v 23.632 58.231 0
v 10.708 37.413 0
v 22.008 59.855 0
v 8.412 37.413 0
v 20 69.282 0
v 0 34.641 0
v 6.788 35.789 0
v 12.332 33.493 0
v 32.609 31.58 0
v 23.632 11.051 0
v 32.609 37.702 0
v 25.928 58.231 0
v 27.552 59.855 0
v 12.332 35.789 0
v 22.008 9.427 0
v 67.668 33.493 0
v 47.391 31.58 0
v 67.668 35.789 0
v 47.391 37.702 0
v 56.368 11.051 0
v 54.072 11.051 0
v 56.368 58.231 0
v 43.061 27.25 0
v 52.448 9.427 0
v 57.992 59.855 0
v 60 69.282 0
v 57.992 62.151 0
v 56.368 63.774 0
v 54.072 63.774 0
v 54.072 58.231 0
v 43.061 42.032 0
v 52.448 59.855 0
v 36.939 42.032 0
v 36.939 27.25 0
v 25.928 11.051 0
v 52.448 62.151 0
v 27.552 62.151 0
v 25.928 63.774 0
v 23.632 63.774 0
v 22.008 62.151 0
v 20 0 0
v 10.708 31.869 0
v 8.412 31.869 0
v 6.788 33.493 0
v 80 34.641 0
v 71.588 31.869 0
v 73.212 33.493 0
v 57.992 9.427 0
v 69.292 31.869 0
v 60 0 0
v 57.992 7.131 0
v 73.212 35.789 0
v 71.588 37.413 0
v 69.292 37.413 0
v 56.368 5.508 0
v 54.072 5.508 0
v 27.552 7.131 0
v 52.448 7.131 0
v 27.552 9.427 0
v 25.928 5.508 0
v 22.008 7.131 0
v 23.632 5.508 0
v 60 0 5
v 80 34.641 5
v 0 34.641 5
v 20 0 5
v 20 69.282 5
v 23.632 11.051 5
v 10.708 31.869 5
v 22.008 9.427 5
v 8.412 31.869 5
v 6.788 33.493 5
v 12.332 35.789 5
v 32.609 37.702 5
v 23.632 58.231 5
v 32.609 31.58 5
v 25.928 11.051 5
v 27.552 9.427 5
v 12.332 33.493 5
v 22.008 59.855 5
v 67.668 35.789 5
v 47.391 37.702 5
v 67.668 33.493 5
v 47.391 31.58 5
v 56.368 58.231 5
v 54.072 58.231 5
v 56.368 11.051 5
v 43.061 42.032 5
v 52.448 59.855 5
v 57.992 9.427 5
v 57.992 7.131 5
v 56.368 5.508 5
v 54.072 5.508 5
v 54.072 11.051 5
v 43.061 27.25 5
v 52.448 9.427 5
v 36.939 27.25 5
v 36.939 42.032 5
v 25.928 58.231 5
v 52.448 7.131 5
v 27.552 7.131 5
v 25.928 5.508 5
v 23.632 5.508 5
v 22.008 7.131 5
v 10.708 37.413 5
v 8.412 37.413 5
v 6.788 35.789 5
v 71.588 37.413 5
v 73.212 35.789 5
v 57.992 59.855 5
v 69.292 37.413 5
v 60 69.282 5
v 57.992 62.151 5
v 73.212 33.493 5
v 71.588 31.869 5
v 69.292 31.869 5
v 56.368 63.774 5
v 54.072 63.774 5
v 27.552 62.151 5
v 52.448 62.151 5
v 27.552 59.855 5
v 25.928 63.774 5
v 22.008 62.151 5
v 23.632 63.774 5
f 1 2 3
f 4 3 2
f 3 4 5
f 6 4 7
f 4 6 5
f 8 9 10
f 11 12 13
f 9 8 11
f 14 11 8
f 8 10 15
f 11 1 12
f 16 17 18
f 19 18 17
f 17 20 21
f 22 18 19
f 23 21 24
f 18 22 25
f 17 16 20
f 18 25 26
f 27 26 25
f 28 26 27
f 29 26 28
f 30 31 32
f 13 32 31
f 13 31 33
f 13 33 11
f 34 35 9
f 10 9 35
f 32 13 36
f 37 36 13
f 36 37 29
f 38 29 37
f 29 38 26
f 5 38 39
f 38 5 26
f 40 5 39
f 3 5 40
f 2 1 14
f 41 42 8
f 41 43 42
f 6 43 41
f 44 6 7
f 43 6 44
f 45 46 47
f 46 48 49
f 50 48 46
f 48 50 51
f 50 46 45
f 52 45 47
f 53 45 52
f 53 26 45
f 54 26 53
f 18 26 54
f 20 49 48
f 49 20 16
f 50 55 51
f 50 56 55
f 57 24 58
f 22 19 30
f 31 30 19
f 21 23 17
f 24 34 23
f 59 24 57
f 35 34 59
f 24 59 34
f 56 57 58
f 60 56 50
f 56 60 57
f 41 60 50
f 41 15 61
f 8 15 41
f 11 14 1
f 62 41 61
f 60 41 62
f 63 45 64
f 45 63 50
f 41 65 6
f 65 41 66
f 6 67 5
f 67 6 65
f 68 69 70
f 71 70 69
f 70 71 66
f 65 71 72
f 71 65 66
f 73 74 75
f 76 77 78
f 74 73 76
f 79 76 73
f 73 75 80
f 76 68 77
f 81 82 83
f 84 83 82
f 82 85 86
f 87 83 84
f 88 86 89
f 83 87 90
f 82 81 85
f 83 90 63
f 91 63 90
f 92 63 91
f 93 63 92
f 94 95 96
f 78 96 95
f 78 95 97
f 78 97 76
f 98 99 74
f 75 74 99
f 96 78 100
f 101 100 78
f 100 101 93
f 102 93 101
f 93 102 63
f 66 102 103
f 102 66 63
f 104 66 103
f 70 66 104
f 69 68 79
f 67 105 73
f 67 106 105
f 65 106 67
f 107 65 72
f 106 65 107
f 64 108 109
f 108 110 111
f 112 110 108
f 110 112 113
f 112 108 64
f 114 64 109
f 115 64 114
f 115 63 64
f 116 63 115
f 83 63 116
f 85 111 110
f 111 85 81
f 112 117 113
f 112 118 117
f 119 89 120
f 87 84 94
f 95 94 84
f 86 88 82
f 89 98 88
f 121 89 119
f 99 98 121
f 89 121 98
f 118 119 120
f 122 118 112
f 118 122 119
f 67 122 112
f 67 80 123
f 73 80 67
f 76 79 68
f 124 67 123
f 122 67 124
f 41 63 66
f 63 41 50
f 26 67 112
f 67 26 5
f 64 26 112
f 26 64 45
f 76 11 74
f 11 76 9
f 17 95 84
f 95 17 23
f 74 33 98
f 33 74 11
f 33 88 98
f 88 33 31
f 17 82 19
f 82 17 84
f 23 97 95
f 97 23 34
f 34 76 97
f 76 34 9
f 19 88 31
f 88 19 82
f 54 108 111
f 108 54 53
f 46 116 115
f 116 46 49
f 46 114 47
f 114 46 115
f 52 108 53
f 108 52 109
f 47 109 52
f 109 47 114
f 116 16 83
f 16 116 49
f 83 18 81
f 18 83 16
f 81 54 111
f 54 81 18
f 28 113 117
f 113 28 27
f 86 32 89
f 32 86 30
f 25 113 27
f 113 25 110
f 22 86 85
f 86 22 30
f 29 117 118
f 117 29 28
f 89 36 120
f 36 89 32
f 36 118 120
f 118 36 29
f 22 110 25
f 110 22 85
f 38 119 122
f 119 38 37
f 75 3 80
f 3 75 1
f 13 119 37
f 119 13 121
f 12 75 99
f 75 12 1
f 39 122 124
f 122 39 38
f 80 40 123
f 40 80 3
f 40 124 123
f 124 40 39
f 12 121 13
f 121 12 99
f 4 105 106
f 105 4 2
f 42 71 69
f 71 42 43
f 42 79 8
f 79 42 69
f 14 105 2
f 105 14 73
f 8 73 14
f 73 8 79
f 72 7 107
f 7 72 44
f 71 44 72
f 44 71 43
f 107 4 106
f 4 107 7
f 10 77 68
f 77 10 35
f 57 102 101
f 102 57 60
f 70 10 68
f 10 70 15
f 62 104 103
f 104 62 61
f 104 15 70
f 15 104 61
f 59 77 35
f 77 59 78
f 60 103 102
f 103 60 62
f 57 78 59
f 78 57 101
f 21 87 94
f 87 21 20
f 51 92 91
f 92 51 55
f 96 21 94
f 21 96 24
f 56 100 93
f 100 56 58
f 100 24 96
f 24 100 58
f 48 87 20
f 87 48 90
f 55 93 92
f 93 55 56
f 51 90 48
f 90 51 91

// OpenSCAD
$fn = 32;

// ----------------------------------------------------------------------
// Polygon plate: 6-gon R40, 6 bolt windows
// ----------------------------------------------------------------------

// --- parameters (mm) ---
sides = 6;                // number of polygon sides
plate_r = 40;             // circumscribed radius of the polygon
bore_r = 8;               // centre bore radius
bolts = 6;                // number of bolt windows
ring_r = 30.44;           // bolt-circle radius
bolt_r = 3;               // bolt window radius
plate_t = 5;              // plate thickness, Z (extrusion height)
fit_tol = 0.1;            // declared fit tolerance (prompt contract)
free_tol = 0.5;           // declared free tolerance (prompt contract)

plate_d = 2 * plate_r;  // circumscribed diameter
bore_d = 2 * bore_r;  // centre bore diameter
bolt_d = 2 * bolt_r;  // bolt window diameter
ring_d = 2 * ring_r;  // bolt-circle diameter

profile = [[80, 34.641], [60, 69.282], [20, 69.282], [0, 34.641], [20, 0], [60, 0]];  // primary outline, 6 points, counter clockwise
void_1 = [[47.391, 37.702], [43.061, 42.032], [36.939, 42.032], [32.609, 37.702], [32.609, 31.58], [36.939, 27.25], [43.061, 27.25], [47.391, 31.58]];  // centre bore, 8 points
void_2 = [[73.212, 35.789], [71.588, 37.413], [69.292, 37.413], [67.668, 35.789], [67.668, 33.493], [69.292, 31.869], [71.588, 31.869], [73.212, 33.493]];  // bolt window 1, 8 points
void_3 = [[57.992, 62.151], [56.368, 63.774], [54.072, 63.774], [52.448, 62.151], [52.448, 59.855], [54.072, 58.231], [56.368, 58.231], [57.992, 59.855]];  // bolt window 2, 8 points
void_4 = [[27.552, 62.151], [25.928, 63.774], [23.632, 63.774], [22.008, 62.151], [22.008, 59.855], [23.632, 58.231], [25.928, 58.231], [27.552, 59.855]];  // bolt window 3, 8 points
void_5 = [[12.332, 35.789], [10.708, 37.413], [8.412, 37.413], [6.788, 35.789], [6.788, 33.493], [8.412, 31.869], [10.708, 31.869], [12.332, 33.493]];  // bolt window 4, 8 points
void_6 = [[27.552, 9.427], [25.928, 11.051], [23.632, 11.051], [22.008, 9.427], [22.008, 7.131], [23.632, 5.508], [25.928, 5.508], [27.552, 7.131]];  // bolt window 5, 8 points
void_7 = [[57.992, 9.427], [56.368, 11.051], [54.072, 11.051], [52.448, 9.427], [52.448, 7.131], [54.072, 5.508], [56.368, 5.508], [57.992, 7.131]];  // bolt window 6, 8 points

// --- the one profile operation ---
difference() {
  linear_extrude(height = plate_t) polygon(points = profile);
  translate([0, 0, -1])
    linear_extrude(height = plate_t + 2) polygon(points = void_1);
  translate([0, 0, -1])
    linear_extrude(height = plate_t + 2) polygon(points = void_2);
  translate([0, 0, -1])
    linear_extrude(height = plate_t + 2) polygon(points = void_3);
  translate([0, 0, -1])
    linear_extrude(height = plate_t + 2) polygon(points = void_4);
  translate([0, 0, -1])
    linear_extrude(height = plate_t + 2) polygon(points = void_5);
  translate([0, 0, -1])
    linear_extrude(height = plate_t + 2) polygon(points = void_6);
  translate([0, 0, -1])
    linear_extrude(height = plate_t + 2) polygon(points = void_7);
}
